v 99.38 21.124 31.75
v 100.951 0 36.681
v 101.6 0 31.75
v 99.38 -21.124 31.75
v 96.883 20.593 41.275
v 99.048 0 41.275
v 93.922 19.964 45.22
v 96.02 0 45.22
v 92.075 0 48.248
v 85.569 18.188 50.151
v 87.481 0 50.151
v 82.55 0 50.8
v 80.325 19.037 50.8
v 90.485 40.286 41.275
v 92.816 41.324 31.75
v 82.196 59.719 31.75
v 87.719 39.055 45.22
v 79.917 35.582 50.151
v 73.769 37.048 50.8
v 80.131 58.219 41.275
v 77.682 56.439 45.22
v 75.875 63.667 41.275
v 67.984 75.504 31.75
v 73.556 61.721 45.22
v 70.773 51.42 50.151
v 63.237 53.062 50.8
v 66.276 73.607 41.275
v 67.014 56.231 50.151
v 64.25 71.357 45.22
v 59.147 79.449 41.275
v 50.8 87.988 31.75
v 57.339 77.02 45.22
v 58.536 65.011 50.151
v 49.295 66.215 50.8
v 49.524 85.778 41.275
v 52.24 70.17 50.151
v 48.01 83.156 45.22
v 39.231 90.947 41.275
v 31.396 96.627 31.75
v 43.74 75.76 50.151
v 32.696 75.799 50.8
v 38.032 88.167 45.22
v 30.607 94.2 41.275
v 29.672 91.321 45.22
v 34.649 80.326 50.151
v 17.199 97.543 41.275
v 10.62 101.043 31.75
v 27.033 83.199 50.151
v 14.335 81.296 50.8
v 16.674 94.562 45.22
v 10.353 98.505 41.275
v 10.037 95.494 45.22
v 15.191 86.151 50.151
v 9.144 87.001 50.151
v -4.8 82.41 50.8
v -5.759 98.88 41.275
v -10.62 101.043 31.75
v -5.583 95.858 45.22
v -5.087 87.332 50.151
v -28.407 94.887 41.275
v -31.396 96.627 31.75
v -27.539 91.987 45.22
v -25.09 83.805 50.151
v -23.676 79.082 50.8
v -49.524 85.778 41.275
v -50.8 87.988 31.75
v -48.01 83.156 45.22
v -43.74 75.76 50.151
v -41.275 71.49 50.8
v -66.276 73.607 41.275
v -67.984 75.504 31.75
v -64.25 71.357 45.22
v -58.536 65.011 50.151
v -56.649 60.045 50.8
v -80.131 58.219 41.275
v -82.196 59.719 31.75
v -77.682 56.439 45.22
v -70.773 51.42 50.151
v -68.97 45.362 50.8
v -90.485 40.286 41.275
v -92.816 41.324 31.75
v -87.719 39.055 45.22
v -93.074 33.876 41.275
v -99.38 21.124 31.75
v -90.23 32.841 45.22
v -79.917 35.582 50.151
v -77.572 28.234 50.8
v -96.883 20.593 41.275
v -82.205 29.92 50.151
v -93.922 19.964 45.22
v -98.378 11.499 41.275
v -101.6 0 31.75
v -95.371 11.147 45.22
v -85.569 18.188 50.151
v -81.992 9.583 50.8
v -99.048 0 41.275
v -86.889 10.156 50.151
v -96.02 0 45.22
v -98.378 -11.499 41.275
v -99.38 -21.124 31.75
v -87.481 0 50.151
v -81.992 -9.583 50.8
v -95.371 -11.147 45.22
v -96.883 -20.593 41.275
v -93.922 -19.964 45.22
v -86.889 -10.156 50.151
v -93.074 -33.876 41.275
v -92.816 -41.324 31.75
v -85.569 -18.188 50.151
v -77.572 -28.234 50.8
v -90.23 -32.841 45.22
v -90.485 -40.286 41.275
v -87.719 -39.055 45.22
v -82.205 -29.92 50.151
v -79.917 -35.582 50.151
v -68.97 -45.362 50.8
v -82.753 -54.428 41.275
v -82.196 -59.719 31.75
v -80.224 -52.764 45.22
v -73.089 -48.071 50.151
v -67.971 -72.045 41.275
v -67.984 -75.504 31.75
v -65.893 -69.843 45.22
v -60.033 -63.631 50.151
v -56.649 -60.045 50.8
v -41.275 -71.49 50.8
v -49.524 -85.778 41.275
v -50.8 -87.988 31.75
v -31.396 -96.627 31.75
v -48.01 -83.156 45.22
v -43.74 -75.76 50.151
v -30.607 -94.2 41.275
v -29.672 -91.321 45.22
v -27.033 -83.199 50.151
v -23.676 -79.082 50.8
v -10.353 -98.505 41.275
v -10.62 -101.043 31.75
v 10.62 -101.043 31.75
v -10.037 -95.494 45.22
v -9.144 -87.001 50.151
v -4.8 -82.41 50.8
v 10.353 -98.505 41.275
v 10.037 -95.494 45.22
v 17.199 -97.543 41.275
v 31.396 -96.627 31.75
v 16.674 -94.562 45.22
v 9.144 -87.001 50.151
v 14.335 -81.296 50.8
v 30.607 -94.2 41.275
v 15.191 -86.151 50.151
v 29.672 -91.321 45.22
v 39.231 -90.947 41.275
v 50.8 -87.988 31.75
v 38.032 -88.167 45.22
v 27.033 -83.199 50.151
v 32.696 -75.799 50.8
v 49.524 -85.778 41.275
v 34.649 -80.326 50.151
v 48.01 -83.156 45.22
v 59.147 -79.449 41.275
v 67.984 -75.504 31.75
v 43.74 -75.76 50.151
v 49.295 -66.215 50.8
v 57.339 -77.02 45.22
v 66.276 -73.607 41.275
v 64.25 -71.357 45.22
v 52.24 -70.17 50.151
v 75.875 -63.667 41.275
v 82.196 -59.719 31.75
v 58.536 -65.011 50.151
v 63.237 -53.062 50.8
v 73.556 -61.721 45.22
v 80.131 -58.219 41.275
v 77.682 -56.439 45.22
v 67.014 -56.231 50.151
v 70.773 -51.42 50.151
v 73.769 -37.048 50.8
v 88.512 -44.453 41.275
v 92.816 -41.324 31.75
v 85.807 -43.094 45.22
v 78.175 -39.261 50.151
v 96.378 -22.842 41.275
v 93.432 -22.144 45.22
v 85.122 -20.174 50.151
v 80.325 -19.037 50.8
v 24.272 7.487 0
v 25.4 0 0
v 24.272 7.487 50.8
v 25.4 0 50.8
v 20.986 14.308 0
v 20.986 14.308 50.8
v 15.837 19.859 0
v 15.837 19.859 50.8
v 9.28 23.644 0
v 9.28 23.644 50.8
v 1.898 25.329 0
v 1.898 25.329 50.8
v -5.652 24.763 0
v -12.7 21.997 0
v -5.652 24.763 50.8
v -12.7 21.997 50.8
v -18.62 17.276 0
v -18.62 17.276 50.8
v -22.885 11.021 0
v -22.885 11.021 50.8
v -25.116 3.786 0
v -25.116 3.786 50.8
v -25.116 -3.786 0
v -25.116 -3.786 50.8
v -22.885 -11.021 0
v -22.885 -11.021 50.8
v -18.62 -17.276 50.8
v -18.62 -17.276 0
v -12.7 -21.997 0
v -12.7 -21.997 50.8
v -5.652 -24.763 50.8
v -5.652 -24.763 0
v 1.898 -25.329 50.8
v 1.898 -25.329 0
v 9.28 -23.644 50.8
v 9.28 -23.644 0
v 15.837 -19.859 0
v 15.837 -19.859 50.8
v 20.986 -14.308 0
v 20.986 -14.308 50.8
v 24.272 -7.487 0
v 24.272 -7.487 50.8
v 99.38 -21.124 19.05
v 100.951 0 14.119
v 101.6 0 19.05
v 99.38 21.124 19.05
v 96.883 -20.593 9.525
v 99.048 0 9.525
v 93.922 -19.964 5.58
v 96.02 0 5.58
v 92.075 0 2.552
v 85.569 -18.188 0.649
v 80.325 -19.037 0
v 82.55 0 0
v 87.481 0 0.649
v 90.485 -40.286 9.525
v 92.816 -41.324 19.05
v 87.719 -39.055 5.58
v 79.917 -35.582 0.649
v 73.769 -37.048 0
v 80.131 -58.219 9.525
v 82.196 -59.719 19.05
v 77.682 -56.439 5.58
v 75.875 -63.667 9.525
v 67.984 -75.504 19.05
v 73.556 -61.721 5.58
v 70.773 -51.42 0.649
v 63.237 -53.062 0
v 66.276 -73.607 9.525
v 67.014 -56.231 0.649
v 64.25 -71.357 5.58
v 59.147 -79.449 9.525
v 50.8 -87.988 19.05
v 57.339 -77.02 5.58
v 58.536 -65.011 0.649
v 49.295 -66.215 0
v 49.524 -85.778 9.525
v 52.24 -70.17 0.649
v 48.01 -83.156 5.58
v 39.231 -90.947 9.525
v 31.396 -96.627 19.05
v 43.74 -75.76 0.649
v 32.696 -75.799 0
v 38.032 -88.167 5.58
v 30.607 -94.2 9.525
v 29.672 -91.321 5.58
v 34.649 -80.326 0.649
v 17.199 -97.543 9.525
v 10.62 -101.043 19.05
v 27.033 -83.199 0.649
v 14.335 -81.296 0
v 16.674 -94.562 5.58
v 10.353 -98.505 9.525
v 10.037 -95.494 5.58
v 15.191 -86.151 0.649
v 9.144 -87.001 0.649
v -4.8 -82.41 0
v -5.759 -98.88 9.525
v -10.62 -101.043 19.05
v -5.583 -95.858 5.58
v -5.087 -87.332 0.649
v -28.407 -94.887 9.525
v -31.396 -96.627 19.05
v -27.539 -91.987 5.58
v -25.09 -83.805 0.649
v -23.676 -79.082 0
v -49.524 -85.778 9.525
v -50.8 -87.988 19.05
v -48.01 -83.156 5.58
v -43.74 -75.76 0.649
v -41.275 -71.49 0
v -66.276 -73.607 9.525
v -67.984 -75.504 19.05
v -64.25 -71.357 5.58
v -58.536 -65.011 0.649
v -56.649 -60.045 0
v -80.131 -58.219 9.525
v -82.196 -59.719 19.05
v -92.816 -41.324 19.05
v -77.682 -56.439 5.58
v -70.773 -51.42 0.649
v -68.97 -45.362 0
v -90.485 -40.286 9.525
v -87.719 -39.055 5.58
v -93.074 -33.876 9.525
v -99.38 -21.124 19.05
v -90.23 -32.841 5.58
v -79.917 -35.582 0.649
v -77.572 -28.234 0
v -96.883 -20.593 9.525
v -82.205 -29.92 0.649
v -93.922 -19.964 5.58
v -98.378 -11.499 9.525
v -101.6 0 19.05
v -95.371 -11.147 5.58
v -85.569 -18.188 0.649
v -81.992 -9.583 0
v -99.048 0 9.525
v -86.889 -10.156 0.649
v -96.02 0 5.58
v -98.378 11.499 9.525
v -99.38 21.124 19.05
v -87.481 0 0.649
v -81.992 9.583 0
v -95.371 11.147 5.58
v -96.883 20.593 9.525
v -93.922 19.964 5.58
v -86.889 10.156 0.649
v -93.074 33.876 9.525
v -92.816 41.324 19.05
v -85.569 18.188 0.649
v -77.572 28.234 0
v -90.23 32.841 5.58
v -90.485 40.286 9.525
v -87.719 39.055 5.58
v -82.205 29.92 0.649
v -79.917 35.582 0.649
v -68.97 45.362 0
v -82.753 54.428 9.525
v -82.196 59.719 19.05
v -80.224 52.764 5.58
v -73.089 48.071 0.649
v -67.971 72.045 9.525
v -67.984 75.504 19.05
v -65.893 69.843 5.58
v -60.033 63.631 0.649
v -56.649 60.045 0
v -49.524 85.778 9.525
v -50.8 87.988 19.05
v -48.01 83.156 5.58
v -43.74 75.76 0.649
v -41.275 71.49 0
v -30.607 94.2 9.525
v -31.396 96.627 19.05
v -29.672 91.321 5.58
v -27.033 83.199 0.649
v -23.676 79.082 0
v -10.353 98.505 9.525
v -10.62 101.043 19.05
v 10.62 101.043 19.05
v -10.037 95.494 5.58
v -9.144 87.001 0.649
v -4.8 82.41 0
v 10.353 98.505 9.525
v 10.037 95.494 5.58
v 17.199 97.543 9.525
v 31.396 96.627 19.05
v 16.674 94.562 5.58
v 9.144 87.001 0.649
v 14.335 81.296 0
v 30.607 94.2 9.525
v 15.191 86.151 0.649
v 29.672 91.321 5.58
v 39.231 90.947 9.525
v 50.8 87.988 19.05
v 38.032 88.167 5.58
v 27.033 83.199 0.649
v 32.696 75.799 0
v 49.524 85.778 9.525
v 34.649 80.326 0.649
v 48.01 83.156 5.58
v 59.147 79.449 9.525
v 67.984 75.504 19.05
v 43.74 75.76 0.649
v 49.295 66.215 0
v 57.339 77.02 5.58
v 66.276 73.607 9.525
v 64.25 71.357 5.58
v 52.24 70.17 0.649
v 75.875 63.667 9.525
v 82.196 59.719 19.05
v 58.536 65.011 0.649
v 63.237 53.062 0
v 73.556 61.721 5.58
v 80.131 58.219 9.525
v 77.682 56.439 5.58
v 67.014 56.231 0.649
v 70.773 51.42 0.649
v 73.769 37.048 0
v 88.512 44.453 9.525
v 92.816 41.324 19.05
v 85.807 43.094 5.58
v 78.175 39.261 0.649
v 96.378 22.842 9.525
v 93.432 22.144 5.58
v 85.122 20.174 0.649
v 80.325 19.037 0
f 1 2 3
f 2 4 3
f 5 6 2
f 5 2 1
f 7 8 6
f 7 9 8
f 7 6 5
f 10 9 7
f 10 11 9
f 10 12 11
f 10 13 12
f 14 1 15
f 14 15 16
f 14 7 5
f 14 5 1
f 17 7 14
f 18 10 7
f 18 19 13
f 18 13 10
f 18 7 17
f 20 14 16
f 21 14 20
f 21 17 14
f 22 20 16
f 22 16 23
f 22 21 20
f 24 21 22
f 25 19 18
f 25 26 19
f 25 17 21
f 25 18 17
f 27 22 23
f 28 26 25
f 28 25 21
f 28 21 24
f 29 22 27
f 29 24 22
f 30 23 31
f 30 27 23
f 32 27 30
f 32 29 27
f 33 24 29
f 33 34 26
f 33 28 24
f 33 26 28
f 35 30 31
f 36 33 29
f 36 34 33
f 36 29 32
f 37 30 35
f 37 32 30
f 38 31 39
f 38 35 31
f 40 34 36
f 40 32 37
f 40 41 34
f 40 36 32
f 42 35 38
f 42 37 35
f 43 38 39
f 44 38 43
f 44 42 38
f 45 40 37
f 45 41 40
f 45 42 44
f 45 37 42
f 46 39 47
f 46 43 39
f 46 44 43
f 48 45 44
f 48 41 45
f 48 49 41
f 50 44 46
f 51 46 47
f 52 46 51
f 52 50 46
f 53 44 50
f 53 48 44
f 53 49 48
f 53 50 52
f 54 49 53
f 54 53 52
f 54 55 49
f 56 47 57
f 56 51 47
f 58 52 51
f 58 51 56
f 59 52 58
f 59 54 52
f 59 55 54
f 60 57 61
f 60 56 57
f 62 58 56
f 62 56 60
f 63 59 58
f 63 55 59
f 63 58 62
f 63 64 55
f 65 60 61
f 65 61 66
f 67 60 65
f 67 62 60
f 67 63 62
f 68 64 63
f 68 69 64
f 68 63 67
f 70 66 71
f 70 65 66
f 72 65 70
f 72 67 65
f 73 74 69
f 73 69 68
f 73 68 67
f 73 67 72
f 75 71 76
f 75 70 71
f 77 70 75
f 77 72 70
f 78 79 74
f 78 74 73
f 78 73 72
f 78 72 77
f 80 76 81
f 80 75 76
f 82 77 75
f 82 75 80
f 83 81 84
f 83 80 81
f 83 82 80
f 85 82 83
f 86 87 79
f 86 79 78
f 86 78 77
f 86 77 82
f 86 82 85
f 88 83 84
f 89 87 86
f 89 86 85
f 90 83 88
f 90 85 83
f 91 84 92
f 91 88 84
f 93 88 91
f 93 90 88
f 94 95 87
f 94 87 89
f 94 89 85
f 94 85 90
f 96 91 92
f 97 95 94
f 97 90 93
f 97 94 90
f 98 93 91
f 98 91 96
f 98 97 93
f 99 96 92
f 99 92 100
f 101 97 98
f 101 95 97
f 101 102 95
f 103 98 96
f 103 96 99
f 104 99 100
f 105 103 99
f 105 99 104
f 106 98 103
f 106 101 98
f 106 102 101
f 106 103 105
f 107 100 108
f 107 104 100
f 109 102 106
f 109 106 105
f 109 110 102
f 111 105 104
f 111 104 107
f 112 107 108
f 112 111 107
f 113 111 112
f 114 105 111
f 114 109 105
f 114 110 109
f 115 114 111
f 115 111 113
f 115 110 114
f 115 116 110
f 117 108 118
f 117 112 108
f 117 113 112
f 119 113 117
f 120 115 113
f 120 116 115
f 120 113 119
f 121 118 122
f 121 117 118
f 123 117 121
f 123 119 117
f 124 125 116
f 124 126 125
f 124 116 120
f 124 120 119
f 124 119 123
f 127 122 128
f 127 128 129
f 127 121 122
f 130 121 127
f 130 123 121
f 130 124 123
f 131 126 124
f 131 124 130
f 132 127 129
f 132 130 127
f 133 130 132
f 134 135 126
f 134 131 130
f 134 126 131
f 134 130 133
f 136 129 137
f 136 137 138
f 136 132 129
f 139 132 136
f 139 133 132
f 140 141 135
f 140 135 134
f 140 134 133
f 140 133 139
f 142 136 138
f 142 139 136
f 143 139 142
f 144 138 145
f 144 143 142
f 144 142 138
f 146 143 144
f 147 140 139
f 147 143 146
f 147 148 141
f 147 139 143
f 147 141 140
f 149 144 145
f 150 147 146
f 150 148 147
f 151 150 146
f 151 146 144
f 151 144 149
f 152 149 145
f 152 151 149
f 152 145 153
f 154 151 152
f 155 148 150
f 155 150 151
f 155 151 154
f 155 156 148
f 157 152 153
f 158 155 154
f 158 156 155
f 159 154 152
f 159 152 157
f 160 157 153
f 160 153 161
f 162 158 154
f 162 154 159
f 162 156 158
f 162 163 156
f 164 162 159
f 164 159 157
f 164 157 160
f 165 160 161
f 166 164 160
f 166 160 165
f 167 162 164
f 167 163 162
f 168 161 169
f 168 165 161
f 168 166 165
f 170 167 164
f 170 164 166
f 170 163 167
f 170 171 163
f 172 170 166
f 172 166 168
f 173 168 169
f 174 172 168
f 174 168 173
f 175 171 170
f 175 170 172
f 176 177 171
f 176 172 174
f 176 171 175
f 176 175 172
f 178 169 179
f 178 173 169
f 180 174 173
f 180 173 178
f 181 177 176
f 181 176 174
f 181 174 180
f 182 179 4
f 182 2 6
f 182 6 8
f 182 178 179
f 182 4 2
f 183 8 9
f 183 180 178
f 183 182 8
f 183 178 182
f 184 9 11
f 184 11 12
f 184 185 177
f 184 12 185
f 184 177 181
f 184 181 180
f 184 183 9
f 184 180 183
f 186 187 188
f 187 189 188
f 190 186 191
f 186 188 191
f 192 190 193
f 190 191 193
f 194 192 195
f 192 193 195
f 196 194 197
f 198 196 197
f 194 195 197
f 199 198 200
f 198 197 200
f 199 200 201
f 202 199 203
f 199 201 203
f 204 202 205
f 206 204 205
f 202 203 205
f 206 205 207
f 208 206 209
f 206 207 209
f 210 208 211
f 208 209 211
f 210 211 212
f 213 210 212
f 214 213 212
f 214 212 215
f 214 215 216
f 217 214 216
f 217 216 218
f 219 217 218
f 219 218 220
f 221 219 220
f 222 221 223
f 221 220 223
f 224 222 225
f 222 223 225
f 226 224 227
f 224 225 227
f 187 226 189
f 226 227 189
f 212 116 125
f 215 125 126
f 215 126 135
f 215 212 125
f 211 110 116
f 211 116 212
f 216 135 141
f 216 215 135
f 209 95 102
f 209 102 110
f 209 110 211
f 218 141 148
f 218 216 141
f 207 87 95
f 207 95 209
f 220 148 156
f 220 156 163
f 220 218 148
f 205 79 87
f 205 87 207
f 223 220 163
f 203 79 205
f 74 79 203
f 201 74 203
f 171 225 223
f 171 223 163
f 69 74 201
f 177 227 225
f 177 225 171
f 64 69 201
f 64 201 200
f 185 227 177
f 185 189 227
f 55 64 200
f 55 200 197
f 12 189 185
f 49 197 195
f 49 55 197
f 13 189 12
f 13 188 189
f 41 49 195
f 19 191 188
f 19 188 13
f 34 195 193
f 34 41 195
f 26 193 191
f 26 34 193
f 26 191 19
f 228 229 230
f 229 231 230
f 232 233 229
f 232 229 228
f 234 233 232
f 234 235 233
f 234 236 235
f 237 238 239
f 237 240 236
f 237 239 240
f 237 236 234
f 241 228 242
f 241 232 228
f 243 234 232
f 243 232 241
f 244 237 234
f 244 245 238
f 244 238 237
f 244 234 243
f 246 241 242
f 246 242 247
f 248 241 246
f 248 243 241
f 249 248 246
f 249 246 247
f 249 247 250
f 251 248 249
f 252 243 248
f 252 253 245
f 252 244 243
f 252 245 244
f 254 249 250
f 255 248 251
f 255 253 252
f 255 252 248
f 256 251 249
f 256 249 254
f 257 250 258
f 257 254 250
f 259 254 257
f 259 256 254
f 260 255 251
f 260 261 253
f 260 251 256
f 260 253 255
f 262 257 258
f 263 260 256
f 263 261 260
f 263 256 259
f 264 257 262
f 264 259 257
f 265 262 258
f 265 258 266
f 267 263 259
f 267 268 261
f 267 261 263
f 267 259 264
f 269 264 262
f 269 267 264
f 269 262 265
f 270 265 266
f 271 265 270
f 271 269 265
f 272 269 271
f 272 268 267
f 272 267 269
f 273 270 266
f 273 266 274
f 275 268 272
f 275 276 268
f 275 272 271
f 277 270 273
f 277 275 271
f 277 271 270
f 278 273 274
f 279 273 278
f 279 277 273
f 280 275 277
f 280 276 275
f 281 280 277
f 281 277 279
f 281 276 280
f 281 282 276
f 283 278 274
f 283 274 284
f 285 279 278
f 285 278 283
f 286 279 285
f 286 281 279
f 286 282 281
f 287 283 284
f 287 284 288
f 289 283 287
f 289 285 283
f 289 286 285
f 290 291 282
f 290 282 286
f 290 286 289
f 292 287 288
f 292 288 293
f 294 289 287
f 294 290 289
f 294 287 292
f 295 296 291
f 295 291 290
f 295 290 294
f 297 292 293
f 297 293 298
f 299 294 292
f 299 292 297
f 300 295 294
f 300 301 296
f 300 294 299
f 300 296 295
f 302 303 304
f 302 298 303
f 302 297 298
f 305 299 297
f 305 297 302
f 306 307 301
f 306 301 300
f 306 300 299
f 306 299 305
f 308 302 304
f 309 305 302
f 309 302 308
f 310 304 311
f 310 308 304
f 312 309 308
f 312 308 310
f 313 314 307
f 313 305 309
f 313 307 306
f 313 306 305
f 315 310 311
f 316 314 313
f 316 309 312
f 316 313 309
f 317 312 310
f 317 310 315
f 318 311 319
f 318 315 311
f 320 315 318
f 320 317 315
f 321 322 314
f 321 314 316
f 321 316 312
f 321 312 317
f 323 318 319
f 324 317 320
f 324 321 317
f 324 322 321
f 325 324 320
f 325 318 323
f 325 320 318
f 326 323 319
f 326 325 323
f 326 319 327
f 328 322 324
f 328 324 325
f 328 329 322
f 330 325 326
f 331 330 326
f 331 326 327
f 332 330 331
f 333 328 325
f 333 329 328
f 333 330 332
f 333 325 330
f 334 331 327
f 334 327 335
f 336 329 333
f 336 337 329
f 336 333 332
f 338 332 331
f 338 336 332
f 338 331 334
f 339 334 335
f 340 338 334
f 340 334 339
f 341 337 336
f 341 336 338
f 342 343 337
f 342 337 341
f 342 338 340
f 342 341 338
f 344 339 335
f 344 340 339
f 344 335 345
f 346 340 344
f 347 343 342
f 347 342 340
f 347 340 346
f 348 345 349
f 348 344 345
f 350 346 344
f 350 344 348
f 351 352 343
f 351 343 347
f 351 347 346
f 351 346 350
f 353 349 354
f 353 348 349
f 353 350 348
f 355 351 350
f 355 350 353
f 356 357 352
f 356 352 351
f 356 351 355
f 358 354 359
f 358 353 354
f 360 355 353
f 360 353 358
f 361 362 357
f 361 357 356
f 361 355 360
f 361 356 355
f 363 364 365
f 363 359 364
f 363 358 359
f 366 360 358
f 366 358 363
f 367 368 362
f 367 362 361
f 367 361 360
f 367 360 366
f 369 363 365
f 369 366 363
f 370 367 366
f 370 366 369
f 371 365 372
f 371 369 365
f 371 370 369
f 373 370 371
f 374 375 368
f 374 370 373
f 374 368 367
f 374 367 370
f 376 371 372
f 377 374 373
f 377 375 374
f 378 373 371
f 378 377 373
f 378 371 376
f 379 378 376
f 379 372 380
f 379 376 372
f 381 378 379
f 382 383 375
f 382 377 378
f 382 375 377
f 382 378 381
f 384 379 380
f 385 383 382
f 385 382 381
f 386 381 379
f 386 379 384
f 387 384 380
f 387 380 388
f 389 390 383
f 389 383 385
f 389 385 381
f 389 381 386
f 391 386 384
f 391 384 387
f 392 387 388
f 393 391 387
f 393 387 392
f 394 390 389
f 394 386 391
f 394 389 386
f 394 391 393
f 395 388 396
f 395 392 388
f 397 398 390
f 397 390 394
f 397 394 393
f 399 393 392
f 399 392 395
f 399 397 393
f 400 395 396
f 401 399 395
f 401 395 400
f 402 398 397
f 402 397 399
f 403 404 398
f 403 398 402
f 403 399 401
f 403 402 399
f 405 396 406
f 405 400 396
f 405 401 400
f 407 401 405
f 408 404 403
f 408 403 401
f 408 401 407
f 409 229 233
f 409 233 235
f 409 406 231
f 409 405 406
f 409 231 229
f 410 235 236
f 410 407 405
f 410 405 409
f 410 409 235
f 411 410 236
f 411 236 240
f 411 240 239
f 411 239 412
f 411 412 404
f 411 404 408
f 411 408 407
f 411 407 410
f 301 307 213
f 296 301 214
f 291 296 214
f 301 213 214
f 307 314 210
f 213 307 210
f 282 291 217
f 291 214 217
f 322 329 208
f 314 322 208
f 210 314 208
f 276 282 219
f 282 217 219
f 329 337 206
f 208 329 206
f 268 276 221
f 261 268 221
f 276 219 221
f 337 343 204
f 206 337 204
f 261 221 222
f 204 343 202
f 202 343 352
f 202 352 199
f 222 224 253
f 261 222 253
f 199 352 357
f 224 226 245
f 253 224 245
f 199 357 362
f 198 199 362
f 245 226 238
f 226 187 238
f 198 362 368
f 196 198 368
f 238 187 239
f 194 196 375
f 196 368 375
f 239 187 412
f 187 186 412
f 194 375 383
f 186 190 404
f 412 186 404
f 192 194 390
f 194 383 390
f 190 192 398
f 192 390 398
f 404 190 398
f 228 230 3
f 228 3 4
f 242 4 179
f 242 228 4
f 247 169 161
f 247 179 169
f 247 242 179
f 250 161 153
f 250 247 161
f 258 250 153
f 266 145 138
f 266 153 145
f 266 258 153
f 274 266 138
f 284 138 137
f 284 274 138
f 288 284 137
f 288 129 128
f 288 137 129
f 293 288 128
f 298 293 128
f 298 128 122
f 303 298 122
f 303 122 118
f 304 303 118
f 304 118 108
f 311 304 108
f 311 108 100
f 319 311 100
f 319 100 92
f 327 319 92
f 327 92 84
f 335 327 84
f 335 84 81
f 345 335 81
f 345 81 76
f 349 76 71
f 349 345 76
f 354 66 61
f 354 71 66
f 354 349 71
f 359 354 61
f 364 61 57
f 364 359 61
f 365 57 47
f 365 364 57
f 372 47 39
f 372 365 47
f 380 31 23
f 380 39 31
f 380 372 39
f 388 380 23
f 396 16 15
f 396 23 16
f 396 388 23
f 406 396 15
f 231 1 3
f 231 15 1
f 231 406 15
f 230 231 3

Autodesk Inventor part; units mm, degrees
ref_plane "YZ Plane" through (0, 0, 0) normal (1, 0, 0) x (0, 1, 0)
ref_plane "XZ Plane" through (0, 0, 0) normal (0, 1, 0) x (-1, 0, 0)
ref_plane "XY Plane" through (0, 0, 0) normal (0, 0, 1) x (1, 0, 0)
sketch "Sketch1" plane through (0, 0, 0) normal (0, 0, 1) x (1, 0, 0)
  circle A0 centre (0, 0) radius 101.6
  dimension "d0" = 203.2
extrude "Extrusion1" add sketch "Sketch1" along normal blind 50.8
fillet "Fillet1" radius 19.05 2 edges at (-101.6, 0, 50.8) (-101.6, 0, 0)
sketch "Sketch2" plane through (0, 0, 50.8) normal (0, 0, 1) x (1, 0, 0)
  circle A0 centre (0, 0) radius 82.55 projected
  circle A1 centre (0, 0) radius 25.4
  dimension "d4" = 50.8
extrude "Extrusion2" cut sketch "Sketch2" against normal through all contours A1
properties part number "ShooterWheelConcept"
